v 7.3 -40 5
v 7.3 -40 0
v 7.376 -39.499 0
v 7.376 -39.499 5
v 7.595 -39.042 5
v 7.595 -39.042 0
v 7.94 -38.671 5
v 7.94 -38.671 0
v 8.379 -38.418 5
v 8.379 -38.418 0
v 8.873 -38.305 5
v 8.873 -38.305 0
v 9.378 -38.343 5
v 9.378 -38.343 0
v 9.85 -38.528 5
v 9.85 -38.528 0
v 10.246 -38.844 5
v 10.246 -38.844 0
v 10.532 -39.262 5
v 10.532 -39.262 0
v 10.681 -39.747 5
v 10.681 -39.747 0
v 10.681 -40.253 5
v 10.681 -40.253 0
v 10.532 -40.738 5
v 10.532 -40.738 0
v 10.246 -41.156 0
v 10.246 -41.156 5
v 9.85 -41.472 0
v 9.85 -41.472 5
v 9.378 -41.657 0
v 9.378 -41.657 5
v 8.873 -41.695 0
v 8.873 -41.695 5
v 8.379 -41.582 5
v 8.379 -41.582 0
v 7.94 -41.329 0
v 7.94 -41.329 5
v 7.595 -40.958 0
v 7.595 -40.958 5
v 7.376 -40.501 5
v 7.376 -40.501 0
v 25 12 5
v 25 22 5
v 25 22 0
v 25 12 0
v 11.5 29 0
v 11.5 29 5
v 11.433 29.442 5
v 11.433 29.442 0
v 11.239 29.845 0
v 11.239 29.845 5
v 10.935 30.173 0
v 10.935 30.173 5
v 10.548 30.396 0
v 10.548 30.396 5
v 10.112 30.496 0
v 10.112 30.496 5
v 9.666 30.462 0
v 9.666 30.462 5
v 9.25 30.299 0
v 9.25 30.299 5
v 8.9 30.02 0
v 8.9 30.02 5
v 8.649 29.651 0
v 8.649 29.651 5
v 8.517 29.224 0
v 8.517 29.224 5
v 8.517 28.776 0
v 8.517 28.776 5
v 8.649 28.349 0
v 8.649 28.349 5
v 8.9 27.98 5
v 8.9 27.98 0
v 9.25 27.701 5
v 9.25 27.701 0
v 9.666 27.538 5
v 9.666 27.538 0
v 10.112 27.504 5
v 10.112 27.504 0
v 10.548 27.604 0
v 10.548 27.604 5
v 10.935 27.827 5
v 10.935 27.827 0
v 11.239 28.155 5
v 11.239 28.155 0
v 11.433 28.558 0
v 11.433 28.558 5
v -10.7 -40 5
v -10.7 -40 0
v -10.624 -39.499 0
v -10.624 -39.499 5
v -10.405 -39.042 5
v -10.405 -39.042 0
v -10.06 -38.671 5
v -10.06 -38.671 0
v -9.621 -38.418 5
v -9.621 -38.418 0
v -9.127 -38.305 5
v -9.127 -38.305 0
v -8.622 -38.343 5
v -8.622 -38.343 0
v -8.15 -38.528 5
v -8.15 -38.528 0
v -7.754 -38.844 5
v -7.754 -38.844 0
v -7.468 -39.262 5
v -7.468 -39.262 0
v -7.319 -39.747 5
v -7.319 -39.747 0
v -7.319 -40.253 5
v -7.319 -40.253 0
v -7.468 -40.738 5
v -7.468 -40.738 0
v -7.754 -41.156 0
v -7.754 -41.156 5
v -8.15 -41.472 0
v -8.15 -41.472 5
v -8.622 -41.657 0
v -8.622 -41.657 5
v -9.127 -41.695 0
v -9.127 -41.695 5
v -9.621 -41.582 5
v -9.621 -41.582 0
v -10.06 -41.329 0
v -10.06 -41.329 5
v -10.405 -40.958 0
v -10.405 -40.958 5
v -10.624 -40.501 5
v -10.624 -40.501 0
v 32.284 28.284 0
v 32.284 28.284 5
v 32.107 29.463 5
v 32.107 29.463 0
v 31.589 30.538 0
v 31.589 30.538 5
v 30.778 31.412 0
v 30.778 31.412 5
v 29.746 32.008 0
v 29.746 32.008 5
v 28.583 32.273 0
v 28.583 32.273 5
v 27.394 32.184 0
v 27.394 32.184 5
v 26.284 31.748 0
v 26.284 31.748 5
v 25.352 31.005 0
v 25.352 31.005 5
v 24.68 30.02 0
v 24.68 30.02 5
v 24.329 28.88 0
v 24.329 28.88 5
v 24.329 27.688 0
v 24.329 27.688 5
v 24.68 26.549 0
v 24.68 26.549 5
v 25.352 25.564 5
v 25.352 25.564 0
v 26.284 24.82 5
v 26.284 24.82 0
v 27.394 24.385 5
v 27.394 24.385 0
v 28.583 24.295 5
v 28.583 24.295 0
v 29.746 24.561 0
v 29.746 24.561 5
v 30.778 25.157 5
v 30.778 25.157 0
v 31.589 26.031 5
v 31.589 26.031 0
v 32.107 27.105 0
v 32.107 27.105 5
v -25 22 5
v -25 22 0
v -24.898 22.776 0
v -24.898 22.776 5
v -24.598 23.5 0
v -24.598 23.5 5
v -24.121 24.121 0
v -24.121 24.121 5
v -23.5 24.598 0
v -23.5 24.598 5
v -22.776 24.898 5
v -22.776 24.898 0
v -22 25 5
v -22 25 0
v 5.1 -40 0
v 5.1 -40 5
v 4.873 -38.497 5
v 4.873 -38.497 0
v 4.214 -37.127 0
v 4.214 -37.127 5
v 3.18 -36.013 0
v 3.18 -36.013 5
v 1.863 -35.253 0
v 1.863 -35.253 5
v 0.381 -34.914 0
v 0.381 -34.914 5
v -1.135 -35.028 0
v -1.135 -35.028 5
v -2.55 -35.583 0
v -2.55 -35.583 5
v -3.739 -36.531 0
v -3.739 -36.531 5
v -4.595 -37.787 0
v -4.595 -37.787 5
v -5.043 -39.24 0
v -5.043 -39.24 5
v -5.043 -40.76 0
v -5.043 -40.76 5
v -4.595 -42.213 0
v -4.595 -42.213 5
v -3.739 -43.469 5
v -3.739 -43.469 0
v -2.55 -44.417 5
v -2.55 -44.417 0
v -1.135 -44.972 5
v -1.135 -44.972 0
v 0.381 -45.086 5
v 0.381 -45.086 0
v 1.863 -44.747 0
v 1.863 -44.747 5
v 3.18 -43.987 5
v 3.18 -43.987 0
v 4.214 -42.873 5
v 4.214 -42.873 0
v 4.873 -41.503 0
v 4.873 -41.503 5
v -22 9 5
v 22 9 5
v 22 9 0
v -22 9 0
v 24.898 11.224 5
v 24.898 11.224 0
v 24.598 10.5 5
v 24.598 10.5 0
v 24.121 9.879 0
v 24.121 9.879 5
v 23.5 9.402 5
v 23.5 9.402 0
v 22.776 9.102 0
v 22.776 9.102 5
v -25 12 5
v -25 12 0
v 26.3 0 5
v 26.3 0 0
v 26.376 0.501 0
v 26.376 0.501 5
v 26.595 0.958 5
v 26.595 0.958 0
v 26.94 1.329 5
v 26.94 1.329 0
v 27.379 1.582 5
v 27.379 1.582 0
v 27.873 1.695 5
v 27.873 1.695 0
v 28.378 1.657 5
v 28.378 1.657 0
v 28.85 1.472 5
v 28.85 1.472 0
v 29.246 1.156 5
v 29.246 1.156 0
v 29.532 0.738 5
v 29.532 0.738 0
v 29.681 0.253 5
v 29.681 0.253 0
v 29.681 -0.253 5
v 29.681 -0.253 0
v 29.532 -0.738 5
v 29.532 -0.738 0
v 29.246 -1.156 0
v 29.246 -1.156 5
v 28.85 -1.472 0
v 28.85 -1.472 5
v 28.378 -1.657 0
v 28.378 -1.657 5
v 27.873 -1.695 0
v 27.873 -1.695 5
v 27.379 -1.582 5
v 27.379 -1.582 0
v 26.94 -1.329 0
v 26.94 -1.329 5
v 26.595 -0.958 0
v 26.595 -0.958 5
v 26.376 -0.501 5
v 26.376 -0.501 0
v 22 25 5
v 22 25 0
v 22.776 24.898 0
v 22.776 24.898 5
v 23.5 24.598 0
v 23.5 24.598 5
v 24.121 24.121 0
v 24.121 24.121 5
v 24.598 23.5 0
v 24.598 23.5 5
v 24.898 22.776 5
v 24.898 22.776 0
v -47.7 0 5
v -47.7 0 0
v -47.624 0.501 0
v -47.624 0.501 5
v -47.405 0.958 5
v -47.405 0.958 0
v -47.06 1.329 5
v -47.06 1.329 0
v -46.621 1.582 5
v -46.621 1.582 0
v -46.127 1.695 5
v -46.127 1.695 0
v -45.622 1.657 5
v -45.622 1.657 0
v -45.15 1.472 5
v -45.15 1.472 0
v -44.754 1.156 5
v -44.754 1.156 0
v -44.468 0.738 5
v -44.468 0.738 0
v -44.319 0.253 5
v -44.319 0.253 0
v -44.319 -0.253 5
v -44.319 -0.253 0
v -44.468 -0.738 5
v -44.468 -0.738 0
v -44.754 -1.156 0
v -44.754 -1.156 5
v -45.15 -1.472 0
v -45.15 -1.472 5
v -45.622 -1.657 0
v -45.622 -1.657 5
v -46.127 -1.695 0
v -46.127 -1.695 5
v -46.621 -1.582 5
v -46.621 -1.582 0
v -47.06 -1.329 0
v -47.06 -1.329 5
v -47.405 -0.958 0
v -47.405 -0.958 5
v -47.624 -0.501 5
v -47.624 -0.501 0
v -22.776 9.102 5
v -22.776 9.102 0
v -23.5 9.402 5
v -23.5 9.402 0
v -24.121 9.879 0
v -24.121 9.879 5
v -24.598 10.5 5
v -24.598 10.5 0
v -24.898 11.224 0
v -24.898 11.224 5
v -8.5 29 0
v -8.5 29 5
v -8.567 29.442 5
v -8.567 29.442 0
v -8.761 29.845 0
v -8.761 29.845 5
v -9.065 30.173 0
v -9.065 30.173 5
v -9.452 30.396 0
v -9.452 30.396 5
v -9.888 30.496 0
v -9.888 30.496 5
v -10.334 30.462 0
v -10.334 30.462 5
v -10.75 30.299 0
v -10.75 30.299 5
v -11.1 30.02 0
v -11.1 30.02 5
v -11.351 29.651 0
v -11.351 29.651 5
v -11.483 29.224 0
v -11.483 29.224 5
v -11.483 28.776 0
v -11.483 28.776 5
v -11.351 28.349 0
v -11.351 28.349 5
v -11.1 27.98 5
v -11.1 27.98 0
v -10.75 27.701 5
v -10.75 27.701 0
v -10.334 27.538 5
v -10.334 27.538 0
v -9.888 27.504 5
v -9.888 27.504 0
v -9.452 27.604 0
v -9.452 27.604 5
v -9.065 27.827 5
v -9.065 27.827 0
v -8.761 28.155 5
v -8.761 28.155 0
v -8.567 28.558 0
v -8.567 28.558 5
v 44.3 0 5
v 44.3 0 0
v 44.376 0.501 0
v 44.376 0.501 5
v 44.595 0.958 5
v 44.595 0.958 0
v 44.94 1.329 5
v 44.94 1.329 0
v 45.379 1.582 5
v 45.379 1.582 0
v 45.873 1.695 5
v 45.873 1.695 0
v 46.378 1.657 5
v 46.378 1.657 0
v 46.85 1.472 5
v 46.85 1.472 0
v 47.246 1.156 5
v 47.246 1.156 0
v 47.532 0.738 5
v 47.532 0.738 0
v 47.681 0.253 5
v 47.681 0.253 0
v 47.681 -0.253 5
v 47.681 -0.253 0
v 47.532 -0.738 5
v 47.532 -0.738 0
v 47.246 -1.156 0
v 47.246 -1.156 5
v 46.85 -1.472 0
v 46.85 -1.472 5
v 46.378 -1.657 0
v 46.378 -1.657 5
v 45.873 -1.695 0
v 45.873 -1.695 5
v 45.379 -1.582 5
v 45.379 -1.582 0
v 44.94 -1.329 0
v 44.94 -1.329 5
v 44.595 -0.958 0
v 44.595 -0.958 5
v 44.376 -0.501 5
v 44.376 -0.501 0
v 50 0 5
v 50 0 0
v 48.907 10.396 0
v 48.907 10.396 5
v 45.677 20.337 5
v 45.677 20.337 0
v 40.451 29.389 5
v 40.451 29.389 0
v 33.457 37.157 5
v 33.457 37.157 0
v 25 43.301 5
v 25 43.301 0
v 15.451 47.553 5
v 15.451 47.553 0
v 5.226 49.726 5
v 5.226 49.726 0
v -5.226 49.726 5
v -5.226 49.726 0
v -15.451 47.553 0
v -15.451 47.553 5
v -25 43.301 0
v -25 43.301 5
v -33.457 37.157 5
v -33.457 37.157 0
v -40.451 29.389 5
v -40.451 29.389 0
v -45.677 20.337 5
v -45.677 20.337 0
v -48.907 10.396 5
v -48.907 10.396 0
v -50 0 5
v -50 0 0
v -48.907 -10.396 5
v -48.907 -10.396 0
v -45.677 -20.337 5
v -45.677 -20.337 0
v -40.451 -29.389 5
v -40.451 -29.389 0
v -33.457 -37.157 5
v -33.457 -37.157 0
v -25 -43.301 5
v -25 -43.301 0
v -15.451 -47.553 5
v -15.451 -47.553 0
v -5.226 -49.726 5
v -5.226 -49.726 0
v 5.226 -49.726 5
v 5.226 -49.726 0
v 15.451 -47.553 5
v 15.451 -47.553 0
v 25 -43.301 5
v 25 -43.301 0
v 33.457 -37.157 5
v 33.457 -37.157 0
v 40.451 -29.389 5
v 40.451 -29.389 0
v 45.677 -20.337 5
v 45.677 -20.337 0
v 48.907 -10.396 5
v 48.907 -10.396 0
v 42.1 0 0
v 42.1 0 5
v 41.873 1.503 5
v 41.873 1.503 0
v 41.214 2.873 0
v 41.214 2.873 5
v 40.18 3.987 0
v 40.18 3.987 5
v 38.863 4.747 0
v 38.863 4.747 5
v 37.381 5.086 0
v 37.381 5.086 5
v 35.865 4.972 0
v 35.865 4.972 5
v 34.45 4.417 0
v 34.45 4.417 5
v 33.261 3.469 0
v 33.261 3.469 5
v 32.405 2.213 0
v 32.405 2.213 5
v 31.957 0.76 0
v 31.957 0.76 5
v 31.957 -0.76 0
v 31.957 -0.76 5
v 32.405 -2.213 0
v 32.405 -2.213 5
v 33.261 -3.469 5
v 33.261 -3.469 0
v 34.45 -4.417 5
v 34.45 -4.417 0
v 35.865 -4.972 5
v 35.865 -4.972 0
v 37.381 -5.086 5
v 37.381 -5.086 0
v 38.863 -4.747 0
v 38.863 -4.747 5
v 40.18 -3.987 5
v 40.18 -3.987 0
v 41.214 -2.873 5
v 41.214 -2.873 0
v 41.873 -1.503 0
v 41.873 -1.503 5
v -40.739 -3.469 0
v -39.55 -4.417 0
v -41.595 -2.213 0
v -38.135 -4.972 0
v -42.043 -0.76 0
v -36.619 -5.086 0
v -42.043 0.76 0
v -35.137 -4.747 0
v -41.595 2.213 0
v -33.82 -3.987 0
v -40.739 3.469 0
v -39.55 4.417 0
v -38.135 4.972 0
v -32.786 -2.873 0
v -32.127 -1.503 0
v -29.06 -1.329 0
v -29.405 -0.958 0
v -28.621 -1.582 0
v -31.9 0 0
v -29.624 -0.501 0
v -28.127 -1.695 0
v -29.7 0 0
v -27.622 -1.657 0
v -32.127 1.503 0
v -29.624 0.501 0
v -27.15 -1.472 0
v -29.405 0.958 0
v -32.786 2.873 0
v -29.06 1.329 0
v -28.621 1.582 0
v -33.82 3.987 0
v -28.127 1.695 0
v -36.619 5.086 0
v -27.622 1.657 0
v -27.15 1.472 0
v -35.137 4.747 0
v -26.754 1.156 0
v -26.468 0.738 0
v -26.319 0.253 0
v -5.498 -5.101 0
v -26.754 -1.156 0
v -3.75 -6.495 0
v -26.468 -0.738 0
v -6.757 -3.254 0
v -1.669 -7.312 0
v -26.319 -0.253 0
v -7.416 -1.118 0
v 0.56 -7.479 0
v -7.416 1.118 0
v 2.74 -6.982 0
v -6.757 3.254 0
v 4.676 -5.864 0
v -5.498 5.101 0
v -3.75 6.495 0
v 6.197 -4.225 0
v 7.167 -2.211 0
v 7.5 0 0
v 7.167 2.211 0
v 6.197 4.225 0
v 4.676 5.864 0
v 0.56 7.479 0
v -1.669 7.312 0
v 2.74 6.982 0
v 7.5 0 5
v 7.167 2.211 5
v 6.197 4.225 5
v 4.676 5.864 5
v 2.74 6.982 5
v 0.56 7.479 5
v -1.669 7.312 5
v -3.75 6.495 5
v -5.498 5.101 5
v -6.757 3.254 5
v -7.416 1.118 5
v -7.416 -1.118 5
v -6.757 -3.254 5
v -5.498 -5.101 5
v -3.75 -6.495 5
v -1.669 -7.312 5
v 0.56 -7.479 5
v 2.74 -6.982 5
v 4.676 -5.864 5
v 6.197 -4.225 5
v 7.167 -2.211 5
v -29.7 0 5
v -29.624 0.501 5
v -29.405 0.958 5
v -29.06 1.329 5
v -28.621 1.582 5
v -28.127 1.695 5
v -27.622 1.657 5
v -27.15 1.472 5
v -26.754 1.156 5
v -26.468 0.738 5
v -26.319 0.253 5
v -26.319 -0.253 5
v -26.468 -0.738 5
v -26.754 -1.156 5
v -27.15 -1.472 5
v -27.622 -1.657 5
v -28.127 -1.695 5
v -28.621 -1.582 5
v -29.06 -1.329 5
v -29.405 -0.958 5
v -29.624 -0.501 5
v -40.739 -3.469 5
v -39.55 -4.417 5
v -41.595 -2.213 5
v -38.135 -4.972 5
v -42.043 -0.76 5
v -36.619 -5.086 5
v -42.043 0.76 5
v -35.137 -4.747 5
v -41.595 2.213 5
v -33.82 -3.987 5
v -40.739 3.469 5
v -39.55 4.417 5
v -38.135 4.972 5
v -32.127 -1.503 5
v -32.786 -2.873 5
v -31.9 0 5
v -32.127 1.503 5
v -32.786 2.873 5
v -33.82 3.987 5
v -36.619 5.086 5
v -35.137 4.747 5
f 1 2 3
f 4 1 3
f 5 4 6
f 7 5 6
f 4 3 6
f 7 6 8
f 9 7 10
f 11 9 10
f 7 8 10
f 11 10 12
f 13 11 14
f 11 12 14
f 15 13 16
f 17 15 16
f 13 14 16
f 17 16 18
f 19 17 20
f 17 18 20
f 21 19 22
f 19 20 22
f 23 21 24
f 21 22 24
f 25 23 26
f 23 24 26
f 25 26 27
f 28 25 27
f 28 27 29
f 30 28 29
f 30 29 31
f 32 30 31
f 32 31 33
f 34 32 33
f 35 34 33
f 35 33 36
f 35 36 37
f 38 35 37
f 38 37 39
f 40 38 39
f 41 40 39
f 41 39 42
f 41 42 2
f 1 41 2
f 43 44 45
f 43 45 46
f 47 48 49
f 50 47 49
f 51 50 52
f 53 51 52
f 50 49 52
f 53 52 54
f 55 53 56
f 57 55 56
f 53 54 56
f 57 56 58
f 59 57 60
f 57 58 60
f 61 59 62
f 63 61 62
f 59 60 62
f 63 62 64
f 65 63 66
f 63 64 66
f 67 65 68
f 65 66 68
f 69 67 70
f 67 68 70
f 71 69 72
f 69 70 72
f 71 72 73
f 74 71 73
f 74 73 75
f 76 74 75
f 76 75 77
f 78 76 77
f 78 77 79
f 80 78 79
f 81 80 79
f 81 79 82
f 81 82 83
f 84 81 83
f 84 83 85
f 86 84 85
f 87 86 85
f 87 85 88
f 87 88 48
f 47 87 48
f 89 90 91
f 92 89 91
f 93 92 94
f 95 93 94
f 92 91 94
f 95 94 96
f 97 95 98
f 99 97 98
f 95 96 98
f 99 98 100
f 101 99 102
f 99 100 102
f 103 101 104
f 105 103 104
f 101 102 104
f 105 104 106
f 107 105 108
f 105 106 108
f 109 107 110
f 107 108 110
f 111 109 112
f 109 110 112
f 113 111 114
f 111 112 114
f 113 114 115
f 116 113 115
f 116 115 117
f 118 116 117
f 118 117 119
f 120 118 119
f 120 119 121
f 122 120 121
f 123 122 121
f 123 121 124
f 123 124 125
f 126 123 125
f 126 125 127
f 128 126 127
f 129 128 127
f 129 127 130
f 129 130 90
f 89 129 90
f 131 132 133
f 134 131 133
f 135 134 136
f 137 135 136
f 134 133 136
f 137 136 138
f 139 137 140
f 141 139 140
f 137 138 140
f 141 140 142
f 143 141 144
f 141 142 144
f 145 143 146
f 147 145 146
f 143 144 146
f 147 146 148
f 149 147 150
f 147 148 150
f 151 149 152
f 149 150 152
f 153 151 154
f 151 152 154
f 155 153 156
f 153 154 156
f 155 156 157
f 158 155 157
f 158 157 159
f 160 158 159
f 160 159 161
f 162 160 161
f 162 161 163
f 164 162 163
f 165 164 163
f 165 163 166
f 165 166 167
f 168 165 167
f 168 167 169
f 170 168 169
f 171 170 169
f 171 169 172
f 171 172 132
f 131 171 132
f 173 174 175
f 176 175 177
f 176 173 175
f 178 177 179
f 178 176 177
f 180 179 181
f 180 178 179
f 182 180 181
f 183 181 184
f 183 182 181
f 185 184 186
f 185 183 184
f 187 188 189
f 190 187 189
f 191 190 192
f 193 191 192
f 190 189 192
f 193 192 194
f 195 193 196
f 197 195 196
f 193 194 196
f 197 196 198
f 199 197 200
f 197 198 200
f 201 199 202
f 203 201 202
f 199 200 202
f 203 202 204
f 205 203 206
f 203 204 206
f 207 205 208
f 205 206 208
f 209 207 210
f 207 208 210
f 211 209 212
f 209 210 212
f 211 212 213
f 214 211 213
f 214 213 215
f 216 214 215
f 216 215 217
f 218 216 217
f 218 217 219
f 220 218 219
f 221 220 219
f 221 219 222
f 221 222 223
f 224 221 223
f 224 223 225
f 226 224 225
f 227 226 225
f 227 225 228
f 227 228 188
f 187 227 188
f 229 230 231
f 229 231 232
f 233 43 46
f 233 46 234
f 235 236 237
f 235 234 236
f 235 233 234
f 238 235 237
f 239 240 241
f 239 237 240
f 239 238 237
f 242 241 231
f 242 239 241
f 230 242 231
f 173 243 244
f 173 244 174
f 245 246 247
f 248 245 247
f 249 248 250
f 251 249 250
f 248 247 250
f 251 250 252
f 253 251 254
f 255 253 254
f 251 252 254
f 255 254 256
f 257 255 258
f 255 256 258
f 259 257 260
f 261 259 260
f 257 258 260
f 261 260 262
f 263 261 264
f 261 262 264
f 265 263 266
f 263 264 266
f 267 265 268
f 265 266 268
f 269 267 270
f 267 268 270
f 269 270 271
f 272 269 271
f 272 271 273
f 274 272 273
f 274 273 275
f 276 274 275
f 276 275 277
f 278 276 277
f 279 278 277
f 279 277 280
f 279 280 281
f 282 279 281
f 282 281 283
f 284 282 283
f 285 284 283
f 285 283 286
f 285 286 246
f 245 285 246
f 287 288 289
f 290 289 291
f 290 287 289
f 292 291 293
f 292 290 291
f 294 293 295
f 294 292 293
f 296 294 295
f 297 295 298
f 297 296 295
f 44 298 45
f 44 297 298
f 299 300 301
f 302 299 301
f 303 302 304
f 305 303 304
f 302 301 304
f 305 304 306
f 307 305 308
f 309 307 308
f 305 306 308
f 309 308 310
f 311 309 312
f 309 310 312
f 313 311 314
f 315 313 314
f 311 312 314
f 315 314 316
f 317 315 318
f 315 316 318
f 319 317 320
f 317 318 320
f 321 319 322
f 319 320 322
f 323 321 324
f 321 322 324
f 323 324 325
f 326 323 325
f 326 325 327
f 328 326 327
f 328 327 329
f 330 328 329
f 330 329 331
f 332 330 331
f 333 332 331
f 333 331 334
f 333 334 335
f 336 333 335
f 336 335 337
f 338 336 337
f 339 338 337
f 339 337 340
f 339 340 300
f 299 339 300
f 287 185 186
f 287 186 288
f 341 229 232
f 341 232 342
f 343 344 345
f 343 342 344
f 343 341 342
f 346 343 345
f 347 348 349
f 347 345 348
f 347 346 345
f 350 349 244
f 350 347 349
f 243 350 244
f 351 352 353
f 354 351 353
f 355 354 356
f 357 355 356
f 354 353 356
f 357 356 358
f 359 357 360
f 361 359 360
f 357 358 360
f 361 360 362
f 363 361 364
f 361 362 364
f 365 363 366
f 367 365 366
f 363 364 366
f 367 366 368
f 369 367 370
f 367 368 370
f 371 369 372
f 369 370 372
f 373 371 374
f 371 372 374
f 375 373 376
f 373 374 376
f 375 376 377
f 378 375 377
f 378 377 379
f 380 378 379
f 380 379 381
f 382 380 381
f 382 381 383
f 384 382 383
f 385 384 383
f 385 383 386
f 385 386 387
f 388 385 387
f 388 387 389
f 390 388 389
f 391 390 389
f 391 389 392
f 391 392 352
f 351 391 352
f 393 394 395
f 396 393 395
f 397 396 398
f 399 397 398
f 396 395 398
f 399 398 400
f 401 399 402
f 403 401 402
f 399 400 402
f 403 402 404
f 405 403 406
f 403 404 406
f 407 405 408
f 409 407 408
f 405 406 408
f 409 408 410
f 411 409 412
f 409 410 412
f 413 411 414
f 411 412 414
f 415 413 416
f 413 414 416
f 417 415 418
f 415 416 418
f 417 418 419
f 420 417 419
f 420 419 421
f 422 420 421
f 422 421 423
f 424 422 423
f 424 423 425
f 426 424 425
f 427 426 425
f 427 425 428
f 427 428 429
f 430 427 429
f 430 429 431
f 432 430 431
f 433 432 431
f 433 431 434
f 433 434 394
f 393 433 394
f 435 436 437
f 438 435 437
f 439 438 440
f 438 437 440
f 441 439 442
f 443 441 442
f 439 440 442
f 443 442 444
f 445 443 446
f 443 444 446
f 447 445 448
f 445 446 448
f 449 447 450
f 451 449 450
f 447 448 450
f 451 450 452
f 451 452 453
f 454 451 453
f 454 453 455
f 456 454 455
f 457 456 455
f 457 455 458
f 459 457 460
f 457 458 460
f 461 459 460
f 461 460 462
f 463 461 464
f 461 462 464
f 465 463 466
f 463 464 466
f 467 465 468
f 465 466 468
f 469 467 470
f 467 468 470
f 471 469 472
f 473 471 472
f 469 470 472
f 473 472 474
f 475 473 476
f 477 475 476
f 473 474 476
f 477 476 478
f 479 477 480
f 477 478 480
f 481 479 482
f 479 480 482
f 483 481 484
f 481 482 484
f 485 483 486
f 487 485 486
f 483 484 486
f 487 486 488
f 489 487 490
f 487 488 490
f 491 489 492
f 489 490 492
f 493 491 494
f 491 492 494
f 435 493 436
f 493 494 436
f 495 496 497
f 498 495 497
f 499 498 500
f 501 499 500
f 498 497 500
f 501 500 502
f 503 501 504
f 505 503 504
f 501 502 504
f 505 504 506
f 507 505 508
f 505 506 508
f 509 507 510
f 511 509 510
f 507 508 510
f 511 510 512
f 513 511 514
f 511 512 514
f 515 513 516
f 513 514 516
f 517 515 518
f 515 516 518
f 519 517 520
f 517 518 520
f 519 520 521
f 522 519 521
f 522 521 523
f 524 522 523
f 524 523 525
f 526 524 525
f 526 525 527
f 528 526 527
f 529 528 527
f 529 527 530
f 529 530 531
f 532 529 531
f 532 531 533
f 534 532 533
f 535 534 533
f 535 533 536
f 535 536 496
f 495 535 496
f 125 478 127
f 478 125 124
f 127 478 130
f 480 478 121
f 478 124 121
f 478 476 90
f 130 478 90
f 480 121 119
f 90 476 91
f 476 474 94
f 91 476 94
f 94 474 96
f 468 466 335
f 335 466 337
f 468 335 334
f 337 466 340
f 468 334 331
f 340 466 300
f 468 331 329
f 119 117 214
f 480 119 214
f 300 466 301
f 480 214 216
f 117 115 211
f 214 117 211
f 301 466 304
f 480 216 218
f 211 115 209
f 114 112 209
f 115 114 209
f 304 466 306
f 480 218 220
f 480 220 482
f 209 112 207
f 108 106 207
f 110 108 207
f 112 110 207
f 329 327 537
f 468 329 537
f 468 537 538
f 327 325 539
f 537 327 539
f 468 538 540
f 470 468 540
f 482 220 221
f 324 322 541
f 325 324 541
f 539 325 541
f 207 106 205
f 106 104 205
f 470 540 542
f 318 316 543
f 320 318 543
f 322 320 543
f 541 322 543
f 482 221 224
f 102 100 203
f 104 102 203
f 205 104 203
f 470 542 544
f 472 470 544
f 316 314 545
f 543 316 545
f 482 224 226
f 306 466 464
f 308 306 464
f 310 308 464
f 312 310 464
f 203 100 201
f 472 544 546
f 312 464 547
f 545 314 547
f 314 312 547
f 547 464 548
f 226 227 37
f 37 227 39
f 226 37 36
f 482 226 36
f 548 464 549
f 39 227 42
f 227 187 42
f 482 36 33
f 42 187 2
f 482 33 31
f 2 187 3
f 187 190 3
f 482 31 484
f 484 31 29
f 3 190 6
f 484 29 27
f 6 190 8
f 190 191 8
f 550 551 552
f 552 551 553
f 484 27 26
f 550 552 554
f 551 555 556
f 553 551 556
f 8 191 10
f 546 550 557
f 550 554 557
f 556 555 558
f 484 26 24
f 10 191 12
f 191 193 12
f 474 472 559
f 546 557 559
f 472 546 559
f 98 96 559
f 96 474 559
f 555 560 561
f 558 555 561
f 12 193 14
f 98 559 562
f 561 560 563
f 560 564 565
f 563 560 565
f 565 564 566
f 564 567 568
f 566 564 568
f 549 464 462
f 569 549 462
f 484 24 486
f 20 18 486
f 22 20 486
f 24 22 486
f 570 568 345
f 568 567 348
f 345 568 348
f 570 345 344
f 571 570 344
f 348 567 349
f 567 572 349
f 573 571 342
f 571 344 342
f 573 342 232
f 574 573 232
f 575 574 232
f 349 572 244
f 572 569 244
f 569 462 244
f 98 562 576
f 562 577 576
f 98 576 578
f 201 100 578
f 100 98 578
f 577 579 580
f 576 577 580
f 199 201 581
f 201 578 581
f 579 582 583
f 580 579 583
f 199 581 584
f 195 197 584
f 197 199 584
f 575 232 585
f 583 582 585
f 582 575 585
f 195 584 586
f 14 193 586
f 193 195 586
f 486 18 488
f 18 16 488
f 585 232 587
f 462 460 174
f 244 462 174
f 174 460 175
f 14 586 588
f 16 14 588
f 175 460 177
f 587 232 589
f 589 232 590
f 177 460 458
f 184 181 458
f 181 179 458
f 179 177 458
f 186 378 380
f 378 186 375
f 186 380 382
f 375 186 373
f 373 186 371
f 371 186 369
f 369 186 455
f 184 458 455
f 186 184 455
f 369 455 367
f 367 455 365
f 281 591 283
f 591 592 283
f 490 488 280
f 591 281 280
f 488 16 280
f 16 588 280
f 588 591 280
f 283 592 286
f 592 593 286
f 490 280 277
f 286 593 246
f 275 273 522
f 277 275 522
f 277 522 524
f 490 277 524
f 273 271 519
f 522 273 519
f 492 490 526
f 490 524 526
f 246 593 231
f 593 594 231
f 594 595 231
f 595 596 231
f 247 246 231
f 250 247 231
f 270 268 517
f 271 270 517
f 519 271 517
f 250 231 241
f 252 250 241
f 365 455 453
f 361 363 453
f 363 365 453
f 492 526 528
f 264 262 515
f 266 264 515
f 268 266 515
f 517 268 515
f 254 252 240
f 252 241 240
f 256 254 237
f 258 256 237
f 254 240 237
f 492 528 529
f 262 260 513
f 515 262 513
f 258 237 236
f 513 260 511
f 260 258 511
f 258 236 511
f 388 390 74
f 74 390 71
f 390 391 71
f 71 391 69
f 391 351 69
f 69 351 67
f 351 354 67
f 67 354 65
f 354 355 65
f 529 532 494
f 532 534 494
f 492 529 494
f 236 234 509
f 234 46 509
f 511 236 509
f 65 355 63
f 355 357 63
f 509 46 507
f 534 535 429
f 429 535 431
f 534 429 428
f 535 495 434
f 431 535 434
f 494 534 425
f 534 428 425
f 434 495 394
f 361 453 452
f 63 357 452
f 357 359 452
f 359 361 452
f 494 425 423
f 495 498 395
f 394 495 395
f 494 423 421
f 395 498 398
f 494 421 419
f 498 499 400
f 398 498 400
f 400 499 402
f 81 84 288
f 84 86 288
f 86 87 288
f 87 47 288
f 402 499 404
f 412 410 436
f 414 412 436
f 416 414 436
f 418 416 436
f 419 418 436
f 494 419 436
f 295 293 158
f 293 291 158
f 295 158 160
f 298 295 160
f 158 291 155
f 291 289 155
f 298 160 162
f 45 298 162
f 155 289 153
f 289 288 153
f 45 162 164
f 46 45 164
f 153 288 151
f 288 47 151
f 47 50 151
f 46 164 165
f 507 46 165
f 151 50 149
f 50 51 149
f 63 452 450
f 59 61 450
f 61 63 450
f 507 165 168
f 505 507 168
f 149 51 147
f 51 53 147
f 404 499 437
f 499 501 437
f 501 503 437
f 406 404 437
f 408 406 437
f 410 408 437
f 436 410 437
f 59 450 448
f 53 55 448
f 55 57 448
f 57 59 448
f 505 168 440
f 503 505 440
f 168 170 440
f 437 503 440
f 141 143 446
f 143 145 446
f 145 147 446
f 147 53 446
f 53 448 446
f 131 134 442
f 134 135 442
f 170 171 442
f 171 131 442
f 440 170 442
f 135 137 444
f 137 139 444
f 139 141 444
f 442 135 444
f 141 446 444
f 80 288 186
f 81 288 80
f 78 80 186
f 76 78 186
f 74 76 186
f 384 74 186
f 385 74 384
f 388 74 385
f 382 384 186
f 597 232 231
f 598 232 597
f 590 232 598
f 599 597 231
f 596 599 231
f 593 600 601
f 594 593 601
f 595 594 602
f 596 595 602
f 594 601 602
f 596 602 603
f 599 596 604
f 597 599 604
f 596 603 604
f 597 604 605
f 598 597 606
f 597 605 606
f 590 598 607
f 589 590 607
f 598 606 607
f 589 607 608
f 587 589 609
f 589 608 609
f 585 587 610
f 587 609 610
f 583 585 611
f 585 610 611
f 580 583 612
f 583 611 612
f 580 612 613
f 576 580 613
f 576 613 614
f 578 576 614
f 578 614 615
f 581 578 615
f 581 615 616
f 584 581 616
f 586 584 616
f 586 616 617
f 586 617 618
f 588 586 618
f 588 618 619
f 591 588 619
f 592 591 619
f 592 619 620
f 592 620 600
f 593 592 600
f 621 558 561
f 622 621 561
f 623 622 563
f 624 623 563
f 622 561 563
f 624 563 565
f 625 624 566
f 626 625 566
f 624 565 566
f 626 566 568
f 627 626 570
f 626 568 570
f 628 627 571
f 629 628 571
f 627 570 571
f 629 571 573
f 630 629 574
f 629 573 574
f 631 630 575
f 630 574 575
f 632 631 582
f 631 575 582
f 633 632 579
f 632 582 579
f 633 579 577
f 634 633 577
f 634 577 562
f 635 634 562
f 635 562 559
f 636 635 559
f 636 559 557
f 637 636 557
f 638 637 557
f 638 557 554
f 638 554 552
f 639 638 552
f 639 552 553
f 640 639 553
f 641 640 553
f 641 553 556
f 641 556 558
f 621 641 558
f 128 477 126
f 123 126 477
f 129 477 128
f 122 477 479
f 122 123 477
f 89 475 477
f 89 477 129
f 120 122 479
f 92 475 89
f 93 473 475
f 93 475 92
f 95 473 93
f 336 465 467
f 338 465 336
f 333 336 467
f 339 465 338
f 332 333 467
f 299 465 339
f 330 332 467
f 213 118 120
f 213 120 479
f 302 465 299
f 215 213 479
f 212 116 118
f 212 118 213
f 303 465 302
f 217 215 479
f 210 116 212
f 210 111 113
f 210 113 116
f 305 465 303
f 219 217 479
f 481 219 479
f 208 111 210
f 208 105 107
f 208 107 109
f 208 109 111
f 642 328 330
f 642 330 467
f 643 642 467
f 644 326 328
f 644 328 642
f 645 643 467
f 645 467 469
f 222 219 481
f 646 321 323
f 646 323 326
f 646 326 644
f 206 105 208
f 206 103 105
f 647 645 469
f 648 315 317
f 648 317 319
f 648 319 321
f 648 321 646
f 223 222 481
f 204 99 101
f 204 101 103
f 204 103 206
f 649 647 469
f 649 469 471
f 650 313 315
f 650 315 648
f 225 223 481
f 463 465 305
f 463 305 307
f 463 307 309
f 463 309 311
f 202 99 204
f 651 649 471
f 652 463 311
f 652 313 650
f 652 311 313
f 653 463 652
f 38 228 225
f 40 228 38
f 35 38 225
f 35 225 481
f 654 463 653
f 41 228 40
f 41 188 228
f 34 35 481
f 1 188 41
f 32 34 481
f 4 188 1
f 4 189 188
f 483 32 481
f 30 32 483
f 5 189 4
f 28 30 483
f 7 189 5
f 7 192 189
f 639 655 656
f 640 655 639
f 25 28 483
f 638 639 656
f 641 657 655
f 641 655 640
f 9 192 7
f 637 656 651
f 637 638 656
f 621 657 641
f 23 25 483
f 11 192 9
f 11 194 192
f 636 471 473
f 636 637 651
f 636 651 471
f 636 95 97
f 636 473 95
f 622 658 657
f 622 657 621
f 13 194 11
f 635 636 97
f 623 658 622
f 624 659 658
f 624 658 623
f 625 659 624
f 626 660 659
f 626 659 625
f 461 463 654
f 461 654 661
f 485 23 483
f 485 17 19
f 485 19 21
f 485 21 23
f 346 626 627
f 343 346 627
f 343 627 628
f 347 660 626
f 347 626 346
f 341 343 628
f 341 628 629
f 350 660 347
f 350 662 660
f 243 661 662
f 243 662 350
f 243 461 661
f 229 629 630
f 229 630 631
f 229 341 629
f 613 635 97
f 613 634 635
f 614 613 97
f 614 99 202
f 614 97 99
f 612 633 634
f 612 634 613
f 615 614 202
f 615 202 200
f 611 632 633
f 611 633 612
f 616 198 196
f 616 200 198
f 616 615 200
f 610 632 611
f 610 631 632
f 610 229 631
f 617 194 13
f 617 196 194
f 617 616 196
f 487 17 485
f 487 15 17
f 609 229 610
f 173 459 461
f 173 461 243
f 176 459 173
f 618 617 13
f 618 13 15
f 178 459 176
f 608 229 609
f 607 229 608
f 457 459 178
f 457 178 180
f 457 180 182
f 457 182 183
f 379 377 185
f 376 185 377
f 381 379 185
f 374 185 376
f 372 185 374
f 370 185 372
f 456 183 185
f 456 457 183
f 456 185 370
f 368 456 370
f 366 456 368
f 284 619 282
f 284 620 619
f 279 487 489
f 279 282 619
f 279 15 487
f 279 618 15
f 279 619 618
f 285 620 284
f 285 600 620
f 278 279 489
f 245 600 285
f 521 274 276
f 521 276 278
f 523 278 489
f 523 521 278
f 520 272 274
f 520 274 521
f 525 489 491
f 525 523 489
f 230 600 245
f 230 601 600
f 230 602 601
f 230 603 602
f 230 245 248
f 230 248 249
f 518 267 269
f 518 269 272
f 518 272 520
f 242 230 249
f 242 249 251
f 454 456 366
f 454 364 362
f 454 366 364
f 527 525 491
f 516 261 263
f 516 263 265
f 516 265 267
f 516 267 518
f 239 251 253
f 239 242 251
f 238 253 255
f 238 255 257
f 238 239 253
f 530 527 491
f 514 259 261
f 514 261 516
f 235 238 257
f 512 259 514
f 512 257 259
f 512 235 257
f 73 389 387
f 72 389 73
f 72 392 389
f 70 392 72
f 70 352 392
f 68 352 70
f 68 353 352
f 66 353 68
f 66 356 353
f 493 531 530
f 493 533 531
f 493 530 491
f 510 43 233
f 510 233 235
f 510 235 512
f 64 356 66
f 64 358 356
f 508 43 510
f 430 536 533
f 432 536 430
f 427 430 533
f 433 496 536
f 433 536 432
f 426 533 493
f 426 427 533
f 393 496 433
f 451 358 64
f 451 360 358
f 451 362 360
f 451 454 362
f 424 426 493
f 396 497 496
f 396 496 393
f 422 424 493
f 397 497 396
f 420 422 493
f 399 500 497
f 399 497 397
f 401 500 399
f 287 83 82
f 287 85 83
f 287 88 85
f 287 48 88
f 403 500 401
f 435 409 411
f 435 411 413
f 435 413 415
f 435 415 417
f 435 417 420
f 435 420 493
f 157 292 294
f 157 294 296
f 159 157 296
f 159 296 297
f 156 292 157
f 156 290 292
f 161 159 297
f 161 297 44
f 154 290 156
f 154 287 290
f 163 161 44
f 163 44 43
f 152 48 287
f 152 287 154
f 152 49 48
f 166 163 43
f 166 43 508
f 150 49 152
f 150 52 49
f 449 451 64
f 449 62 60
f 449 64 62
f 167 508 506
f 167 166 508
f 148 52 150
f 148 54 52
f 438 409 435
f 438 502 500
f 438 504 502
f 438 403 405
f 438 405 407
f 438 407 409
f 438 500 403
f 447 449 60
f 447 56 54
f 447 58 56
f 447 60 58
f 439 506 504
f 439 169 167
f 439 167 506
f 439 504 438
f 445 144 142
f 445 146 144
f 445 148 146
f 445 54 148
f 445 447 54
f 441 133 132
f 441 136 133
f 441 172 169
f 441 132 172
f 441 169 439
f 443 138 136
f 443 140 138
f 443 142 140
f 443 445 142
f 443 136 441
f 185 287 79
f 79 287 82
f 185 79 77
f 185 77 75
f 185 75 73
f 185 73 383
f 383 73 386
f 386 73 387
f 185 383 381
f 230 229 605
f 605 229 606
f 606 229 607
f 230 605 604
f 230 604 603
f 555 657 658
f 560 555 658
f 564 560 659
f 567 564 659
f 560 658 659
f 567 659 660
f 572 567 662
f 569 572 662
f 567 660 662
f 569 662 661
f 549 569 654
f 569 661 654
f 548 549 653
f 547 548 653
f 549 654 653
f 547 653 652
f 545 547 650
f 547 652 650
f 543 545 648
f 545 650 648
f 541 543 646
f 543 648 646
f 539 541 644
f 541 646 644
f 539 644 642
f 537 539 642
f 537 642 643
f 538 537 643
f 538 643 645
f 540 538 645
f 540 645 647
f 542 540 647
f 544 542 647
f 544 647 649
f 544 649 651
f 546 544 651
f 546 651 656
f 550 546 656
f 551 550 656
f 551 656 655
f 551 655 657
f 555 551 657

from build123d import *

# Parameters (mm, degrees)
SKETCH1_R                    = 50
BOSS_EXTRUDE1_DEPTH          = 5
F_15_0_15_DIAMETER_HOLE1_D   = 15
F_10_2_10_2_DIAMETER_HOLE1_D = 10.2
M3_CLEARANCE_HOLE1_D         = 3.4
CUT_EXTRUDE1_DEPTH           = 10
SKETCH10_R                   = 1.5
CUT_EXTRUDE2_DEPTH           = 10
SKETCH11_R                   = 4
CUT_EXTRUDE3_DEPTH           = 10


with BuildPart() as part:
    # Sketch1 → Boss-Extrude1 (new body)
    with BuildSketch(Plane.XY):
        Circle(SKETCH1_R)
    extrude(amount=BOSS_EXTRUDE1_DEPTH)

    # Ø15.0 (15) Diameter Hole1 (through all)
    with Locations(Plane(origin=(0, 0, 0), x_dir=(-1, 0, 0), z_dir=(0, 0, -1))):
        with Locations((0, 0)):
            Hole(F_15_0_15_DIAMETER_HOLE1_D / 2)

    # Ø10.2 (10.2) Diameter Hole1 (through all)
    with Locations(Plane(origin=(0, 0, 0), x_dir=(-1, 0, 0), z_dir=(0, 0, -1))):
        with Locations((37, 0), (-37, 0), (0, -40)):
            Hole(F_10_2_10_2_DIAMETER_HOLE1_D / 2)

    # M3 Clearance Hole1 (through all)
    with Locations(Plane.XY.offset(5)):
        with Locations((46, 0), (28, 0), (9, -40), (-9, -40), (-46, 0), (-28, 0)):
            Hole(M3_CLEARANCE_HOLE1_D / 2)

    # Sketch9 → Cut-Extrude1 (cut)
    with BuildSketch(Plane.XY.offset(5)):
        with BuildLine():
            Line((-22, 25), (22, 25))
            ThreePointArc((22, 25), (24.121320344, 24.121320344), (25, 22))
            Line((25, 22), (25, 12))
            ThreePointArc((25, 12), (24.121320344, 9.878679656), (22, 9))
            Line((22, 9), (-22, 9))
            ThreePointArc((-22, 9), (-24.121320344, 9.878679656), (-25, 12))
            Line((-25, 12), (-25, 22))
            ThreePointArc((-25, 22), (-24.121320344, 24.121320344), (-22, 25))
        make_face()
    extrude(amount=-CUT_EXTRUDE1_DEPTH, mode=Mode.SUBTRACT)

    # Sketch10 → Cut-Extrude2 (cut)
    with BuildSketch(Plane.XY.offset(5)):
        with Locations((-10, 29)):
            Circle(SKETCH10_R)
        with Locations((10, 29)):
            Circle(SKETCH10_R)
    extrude(amount=-CUT_EXTRUDE2_DEPTH, mode=Mode.SUBTRACT)

    # Sketch11 → Cut-Extrude3 (cut)
    with BuildSketch(Plane.XY.offset(5)):
        with Locations((28.284271247, 28.284271247)):
            Circle(SKETCH11_R)
    extrude(amount=-CUT_EXTRUDE3_DEPTH, mode=Mode.SUBTRACT)


solid = part.part
